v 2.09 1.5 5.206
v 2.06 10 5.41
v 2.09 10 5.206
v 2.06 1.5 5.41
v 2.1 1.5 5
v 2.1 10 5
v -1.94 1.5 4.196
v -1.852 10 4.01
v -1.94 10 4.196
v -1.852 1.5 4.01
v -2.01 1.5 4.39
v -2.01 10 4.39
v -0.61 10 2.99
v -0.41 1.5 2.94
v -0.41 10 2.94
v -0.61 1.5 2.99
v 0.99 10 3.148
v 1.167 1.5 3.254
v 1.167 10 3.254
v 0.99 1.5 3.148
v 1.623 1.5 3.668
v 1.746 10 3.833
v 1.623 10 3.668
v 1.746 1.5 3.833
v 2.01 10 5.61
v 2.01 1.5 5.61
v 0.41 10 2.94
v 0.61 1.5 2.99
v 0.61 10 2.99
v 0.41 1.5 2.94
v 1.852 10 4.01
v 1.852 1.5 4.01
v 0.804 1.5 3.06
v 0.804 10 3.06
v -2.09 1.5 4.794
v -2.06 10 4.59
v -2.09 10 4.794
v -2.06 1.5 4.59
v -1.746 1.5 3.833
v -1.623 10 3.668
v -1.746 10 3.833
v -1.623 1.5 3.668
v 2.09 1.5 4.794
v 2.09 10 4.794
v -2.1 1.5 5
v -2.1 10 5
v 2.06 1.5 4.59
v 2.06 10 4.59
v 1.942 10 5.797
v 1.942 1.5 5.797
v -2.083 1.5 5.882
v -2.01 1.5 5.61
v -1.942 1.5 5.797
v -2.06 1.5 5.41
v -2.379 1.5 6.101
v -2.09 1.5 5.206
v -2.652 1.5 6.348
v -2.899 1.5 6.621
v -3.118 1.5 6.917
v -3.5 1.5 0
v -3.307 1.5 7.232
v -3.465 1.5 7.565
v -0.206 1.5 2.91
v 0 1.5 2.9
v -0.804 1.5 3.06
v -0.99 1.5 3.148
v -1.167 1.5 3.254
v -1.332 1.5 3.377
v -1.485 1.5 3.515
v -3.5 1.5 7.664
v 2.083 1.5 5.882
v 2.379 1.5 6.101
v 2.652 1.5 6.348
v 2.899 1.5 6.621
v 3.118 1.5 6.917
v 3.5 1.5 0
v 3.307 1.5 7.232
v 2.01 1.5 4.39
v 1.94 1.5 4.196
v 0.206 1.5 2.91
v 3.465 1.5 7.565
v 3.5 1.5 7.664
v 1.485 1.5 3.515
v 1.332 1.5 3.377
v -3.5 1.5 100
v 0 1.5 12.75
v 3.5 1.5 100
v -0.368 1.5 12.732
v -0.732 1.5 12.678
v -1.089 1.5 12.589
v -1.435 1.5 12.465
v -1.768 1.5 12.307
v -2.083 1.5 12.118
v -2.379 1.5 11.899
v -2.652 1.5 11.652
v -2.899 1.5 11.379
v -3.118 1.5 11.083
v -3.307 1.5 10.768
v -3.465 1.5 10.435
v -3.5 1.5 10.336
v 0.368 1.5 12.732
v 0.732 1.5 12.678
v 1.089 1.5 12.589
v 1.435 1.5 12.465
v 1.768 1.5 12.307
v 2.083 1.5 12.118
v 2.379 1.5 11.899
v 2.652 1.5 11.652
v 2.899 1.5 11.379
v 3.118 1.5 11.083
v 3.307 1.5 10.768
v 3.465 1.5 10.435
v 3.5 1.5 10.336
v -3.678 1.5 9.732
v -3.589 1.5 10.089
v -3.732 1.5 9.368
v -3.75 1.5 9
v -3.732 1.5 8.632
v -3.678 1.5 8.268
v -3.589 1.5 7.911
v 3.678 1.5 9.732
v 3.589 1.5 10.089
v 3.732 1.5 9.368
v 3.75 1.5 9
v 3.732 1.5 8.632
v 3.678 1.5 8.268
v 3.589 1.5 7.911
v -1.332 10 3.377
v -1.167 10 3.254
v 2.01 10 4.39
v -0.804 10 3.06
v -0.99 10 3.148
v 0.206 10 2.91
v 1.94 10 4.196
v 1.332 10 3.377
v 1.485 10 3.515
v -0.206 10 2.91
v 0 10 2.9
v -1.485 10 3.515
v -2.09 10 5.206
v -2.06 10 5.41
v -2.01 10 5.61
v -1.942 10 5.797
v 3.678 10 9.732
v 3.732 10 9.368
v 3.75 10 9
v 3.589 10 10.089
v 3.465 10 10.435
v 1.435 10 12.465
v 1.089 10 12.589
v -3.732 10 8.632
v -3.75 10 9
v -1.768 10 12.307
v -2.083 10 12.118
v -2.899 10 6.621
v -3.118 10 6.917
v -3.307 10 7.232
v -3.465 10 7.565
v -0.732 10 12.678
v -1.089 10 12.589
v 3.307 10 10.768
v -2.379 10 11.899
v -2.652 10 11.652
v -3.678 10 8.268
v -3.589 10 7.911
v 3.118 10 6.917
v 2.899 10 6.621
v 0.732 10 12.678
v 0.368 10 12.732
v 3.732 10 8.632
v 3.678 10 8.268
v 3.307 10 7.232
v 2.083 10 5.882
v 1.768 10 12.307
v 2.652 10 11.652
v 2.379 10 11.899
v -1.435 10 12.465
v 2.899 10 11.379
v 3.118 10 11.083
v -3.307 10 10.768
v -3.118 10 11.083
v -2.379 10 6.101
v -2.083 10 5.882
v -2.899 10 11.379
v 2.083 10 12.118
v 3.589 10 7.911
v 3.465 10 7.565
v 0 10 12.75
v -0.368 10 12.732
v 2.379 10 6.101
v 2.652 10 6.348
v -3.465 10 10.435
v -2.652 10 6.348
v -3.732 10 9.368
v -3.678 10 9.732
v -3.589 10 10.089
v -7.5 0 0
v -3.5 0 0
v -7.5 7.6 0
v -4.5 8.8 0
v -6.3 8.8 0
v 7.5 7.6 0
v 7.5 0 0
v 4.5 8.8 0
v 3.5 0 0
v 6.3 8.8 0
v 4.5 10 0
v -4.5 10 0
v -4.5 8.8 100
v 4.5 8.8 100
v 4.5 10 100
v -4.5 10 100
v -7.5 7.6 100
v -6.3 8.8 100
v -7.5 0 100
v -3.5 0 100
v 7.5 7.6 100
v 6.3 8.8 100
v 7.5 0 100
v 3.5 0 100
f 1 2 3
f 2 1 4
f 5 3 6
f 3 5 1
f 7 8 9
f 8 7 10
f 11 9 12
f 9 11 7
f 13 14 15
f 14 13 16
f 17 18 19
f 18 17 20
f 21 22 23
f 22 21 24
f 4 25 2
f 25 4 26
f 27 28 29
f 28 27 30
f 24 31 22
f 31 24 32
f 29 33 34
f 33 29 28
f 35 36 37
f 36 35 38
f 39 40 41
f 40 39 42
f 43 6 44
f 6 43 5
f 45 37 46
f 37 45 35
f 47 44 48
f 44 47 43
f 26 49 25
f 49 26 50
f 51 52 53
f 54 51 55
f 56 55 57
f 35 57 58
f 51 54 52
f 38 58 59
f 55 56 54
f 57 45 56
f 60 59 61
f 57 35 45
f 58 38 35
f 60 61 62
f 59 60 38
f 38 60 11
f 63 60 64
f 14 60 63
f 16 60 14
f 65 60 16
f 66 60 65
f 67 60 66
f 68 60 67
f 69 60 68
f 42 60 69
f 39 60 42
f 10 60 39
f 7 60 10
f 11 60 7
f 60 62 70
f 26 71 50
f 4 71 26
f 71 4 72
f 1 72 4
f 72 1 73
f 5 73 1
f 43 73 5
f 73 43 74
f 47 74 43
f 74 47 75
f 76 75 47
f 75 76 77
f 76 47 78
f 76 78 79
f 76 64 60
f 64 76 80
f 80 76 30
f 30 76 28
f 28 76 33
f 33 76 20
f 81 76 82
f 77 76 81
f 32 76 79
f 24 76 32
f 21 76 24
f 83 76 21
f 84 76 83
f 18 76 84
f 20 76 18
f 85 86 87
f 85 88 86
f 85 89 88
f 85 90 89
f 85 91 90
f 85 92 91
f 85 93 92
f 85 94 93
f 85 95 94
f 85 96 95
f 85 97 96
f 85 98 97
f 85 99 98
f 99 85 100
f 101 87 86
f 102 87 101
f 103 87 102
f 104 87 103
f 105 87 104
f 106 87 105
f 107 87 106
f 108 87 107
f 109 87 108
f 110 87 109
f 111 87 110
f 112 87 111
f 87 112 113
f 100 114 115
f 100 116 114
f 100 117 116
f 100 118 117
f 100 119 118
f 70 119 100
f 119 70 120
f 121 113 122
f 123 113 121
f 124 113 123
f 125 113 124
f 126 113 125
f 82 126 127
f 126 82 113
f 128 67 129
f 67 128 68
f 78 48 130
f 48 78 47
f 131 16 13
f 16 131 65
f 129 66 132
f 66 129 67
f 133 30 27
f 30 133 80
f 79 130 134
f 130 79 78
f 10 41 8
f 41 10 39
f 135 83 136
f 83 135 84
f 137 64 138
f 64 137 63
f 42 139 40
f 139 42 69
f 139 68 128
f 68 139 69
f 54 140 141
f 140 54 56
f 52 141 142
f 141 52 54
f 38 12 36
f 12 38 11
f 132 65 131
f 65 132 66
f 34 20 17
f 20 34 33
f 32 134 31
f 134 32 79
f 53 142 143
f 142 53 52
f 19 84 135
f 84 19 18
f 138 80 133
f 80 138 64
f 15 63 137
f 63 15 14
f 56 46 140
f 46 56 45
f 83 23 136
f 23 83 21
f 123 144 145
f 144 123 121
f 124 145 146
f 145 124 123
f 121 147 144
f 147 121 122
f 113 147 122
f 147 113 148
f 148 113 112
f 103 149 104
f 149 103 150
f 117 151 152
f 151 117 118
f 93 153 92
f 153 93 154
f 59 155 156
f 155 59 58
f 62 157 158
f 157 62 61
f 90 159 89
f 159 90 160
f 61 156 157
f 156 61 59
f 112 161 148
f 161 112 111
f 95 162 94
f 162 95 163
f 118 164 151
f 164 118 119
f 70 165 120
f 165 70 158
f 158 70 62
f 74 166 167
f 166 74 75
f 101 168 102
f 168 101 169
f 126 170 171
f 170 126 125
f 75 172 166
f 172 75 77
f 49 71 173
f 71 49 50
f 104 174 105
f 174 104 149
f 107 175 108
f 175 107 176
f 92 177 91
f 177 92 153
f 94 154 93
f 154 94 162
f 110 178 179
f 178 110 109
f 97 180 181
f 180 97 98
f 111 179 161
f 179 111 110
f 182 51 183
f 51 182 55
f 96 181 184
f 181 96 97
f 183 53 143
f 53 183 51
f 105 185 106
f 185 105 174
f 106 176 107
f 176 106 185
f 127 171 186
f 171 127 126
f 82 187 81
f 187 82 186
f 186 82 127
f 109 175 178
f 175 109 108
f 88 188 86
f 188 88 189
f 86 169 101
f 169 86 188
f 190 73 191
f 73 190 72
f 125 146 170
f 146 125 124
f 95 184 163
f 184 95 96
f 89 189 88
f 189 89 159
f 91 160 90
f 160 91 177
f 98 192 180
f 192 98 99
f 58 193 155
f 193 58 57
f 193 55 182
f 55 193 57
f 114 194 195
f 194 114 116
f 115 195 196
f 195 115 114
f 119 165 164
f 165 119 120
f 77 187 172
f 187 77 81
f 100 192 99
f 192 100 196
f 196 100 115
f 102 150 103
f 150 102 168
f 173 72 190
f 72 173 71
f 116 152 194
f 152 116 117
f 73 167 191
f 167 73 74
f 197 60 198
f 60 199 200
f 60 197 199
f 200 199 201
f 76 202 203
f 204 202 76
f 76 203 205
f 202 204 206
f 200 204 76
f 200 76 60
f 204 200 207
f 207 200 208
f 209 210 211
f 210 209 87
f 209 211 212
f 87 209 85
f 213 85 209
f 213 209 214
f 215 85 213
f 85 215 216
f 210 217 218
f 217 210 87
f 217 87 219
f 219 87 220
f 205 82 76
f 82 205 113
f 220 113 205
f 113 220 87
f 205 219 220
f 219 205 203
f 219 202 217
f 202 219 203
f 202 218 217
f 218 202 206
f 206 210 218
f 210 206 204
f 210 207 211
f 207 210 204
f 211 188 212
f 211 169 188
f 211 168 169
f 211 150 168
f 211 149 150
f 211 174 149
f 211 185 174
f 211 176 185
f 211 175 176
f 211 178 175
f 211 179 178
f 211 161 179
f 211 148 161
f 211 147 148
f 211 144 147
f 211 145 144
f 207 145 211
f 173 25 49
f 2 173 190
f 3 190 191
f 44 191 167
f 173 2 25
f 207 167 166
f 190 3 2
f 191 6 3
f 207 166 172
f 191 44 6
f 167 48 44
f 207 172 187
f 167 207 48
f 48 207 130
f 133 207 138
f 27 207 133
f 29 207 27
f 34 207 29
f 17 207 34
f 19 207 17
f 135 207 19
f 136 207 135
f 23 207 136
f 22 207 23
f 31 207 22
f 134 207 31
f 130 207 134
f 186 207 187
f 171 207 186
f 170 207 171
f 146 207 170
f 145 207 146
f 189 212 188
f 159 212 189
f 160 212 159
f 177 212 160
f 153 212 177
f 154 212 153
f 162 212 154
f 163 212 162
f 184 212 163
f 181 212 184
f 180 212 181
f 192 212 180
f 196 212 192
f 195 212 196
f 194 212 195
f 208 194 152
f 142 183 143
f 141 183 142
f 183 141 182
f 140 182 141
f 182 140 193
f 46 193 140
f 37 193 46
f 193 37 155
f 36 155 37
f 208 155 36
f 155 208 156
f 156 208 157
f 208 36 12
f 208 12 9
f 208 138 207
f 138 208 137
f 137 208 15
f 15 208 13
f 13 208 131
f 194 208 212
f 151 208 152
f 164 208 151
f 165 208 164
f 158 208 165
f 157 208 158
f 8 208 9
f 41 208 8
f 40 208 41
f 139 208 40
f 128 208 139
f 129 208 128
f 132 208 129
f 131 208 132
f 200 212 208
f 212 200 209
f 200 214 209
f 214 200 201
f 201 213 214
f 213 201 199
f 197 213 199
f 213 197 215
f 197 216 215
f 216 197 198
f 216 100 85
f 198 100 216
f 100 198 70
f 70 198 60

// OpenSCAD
$fn = 64;

// Miniature linear guide rail
rail_w = 15.0;   // width (X)
rail_h = 10.0;   // height (Z)
rail_l = 100.0;  // length (Y)

// Simple profile details (approximate)
top_flat_w = 9.0;
top_flat_h = 1.2;

side_chamfer = 1.2;   // chamfer size on top edges
bottom_relief_w = 7.0;
bottom_relief_h = 1.5;

hole_d = 4.2;         // mounting hole diameter
csk_d = 7.5;          // counterbore diameter
csk_h = 2.0;          // counterbore depth
end_margin = 10.0;
hole_pitch = 20.0;

module rail_body() {
    // Build a simple rail-like cross-section via polygon extrusion along Y
    // Cross-section in X-Z plane, centered at X=0, Z=0..rail_h
    w = rail_w;
    h = rail_h;
    tfw = top_flat_w;
    tfh = top_flat_h;
    ch = side_chamfer;
    brw = bottom_relief_w;
    brh = bottom_relief_h;

    // Ensure sane constraints
    tfw2 = min(tfw, w - 2*ch);
    brw2 = min(brw, w - 2*0.5);

    pts = [
        [-w/2, 0],
        [-w/2, h - tfh - ch],
        [-w/2 + ch, h - tfh],
        [-tfw2/2, h - tfh],
        [-tfw2/2, h],
        [ tfw2/2, h],
        [ tfw2/2, h - tfh],
        [ w/2 - ch, h - tfh],
        [ w/2, h - tfh - ch],
        [ w/2, 0],
        [ brw2/2, 0],
        [ brw2/2, brh],
        [-brw2/2, brh],
        [-brw2/2, 0]
    ];

    linear_extrude(height = rail_l, center = false, convexity = 10)
        polygon(points = pts);
}

module mounting_holes() {
    // Holes along Y, centered in X, drilled from top down
    // Place holes starting at end_margin, then every hole_pitch, ending before rail_l - end_margin
    for (y = [end_margin : hole_pitch : rail_l - end_margin + 0.001]) {
        // Through hole
        translate([0, y, rail_h/2])
            rotate([90, 0, 0])
                cylinder(d = hole_d, h = rail_w + 2, center = true);

        // Counterbore from top
        translate([0, y, rail_h - csk_h/2])
            rotate([90, 0, 0])
                cylinder(d = csk_d, h = rail_w + 2, center = true);
    }
}

difference() {
    // Orient: X=width, Y=length, Z=height
    rail_body();
    mounting_holes();
}
